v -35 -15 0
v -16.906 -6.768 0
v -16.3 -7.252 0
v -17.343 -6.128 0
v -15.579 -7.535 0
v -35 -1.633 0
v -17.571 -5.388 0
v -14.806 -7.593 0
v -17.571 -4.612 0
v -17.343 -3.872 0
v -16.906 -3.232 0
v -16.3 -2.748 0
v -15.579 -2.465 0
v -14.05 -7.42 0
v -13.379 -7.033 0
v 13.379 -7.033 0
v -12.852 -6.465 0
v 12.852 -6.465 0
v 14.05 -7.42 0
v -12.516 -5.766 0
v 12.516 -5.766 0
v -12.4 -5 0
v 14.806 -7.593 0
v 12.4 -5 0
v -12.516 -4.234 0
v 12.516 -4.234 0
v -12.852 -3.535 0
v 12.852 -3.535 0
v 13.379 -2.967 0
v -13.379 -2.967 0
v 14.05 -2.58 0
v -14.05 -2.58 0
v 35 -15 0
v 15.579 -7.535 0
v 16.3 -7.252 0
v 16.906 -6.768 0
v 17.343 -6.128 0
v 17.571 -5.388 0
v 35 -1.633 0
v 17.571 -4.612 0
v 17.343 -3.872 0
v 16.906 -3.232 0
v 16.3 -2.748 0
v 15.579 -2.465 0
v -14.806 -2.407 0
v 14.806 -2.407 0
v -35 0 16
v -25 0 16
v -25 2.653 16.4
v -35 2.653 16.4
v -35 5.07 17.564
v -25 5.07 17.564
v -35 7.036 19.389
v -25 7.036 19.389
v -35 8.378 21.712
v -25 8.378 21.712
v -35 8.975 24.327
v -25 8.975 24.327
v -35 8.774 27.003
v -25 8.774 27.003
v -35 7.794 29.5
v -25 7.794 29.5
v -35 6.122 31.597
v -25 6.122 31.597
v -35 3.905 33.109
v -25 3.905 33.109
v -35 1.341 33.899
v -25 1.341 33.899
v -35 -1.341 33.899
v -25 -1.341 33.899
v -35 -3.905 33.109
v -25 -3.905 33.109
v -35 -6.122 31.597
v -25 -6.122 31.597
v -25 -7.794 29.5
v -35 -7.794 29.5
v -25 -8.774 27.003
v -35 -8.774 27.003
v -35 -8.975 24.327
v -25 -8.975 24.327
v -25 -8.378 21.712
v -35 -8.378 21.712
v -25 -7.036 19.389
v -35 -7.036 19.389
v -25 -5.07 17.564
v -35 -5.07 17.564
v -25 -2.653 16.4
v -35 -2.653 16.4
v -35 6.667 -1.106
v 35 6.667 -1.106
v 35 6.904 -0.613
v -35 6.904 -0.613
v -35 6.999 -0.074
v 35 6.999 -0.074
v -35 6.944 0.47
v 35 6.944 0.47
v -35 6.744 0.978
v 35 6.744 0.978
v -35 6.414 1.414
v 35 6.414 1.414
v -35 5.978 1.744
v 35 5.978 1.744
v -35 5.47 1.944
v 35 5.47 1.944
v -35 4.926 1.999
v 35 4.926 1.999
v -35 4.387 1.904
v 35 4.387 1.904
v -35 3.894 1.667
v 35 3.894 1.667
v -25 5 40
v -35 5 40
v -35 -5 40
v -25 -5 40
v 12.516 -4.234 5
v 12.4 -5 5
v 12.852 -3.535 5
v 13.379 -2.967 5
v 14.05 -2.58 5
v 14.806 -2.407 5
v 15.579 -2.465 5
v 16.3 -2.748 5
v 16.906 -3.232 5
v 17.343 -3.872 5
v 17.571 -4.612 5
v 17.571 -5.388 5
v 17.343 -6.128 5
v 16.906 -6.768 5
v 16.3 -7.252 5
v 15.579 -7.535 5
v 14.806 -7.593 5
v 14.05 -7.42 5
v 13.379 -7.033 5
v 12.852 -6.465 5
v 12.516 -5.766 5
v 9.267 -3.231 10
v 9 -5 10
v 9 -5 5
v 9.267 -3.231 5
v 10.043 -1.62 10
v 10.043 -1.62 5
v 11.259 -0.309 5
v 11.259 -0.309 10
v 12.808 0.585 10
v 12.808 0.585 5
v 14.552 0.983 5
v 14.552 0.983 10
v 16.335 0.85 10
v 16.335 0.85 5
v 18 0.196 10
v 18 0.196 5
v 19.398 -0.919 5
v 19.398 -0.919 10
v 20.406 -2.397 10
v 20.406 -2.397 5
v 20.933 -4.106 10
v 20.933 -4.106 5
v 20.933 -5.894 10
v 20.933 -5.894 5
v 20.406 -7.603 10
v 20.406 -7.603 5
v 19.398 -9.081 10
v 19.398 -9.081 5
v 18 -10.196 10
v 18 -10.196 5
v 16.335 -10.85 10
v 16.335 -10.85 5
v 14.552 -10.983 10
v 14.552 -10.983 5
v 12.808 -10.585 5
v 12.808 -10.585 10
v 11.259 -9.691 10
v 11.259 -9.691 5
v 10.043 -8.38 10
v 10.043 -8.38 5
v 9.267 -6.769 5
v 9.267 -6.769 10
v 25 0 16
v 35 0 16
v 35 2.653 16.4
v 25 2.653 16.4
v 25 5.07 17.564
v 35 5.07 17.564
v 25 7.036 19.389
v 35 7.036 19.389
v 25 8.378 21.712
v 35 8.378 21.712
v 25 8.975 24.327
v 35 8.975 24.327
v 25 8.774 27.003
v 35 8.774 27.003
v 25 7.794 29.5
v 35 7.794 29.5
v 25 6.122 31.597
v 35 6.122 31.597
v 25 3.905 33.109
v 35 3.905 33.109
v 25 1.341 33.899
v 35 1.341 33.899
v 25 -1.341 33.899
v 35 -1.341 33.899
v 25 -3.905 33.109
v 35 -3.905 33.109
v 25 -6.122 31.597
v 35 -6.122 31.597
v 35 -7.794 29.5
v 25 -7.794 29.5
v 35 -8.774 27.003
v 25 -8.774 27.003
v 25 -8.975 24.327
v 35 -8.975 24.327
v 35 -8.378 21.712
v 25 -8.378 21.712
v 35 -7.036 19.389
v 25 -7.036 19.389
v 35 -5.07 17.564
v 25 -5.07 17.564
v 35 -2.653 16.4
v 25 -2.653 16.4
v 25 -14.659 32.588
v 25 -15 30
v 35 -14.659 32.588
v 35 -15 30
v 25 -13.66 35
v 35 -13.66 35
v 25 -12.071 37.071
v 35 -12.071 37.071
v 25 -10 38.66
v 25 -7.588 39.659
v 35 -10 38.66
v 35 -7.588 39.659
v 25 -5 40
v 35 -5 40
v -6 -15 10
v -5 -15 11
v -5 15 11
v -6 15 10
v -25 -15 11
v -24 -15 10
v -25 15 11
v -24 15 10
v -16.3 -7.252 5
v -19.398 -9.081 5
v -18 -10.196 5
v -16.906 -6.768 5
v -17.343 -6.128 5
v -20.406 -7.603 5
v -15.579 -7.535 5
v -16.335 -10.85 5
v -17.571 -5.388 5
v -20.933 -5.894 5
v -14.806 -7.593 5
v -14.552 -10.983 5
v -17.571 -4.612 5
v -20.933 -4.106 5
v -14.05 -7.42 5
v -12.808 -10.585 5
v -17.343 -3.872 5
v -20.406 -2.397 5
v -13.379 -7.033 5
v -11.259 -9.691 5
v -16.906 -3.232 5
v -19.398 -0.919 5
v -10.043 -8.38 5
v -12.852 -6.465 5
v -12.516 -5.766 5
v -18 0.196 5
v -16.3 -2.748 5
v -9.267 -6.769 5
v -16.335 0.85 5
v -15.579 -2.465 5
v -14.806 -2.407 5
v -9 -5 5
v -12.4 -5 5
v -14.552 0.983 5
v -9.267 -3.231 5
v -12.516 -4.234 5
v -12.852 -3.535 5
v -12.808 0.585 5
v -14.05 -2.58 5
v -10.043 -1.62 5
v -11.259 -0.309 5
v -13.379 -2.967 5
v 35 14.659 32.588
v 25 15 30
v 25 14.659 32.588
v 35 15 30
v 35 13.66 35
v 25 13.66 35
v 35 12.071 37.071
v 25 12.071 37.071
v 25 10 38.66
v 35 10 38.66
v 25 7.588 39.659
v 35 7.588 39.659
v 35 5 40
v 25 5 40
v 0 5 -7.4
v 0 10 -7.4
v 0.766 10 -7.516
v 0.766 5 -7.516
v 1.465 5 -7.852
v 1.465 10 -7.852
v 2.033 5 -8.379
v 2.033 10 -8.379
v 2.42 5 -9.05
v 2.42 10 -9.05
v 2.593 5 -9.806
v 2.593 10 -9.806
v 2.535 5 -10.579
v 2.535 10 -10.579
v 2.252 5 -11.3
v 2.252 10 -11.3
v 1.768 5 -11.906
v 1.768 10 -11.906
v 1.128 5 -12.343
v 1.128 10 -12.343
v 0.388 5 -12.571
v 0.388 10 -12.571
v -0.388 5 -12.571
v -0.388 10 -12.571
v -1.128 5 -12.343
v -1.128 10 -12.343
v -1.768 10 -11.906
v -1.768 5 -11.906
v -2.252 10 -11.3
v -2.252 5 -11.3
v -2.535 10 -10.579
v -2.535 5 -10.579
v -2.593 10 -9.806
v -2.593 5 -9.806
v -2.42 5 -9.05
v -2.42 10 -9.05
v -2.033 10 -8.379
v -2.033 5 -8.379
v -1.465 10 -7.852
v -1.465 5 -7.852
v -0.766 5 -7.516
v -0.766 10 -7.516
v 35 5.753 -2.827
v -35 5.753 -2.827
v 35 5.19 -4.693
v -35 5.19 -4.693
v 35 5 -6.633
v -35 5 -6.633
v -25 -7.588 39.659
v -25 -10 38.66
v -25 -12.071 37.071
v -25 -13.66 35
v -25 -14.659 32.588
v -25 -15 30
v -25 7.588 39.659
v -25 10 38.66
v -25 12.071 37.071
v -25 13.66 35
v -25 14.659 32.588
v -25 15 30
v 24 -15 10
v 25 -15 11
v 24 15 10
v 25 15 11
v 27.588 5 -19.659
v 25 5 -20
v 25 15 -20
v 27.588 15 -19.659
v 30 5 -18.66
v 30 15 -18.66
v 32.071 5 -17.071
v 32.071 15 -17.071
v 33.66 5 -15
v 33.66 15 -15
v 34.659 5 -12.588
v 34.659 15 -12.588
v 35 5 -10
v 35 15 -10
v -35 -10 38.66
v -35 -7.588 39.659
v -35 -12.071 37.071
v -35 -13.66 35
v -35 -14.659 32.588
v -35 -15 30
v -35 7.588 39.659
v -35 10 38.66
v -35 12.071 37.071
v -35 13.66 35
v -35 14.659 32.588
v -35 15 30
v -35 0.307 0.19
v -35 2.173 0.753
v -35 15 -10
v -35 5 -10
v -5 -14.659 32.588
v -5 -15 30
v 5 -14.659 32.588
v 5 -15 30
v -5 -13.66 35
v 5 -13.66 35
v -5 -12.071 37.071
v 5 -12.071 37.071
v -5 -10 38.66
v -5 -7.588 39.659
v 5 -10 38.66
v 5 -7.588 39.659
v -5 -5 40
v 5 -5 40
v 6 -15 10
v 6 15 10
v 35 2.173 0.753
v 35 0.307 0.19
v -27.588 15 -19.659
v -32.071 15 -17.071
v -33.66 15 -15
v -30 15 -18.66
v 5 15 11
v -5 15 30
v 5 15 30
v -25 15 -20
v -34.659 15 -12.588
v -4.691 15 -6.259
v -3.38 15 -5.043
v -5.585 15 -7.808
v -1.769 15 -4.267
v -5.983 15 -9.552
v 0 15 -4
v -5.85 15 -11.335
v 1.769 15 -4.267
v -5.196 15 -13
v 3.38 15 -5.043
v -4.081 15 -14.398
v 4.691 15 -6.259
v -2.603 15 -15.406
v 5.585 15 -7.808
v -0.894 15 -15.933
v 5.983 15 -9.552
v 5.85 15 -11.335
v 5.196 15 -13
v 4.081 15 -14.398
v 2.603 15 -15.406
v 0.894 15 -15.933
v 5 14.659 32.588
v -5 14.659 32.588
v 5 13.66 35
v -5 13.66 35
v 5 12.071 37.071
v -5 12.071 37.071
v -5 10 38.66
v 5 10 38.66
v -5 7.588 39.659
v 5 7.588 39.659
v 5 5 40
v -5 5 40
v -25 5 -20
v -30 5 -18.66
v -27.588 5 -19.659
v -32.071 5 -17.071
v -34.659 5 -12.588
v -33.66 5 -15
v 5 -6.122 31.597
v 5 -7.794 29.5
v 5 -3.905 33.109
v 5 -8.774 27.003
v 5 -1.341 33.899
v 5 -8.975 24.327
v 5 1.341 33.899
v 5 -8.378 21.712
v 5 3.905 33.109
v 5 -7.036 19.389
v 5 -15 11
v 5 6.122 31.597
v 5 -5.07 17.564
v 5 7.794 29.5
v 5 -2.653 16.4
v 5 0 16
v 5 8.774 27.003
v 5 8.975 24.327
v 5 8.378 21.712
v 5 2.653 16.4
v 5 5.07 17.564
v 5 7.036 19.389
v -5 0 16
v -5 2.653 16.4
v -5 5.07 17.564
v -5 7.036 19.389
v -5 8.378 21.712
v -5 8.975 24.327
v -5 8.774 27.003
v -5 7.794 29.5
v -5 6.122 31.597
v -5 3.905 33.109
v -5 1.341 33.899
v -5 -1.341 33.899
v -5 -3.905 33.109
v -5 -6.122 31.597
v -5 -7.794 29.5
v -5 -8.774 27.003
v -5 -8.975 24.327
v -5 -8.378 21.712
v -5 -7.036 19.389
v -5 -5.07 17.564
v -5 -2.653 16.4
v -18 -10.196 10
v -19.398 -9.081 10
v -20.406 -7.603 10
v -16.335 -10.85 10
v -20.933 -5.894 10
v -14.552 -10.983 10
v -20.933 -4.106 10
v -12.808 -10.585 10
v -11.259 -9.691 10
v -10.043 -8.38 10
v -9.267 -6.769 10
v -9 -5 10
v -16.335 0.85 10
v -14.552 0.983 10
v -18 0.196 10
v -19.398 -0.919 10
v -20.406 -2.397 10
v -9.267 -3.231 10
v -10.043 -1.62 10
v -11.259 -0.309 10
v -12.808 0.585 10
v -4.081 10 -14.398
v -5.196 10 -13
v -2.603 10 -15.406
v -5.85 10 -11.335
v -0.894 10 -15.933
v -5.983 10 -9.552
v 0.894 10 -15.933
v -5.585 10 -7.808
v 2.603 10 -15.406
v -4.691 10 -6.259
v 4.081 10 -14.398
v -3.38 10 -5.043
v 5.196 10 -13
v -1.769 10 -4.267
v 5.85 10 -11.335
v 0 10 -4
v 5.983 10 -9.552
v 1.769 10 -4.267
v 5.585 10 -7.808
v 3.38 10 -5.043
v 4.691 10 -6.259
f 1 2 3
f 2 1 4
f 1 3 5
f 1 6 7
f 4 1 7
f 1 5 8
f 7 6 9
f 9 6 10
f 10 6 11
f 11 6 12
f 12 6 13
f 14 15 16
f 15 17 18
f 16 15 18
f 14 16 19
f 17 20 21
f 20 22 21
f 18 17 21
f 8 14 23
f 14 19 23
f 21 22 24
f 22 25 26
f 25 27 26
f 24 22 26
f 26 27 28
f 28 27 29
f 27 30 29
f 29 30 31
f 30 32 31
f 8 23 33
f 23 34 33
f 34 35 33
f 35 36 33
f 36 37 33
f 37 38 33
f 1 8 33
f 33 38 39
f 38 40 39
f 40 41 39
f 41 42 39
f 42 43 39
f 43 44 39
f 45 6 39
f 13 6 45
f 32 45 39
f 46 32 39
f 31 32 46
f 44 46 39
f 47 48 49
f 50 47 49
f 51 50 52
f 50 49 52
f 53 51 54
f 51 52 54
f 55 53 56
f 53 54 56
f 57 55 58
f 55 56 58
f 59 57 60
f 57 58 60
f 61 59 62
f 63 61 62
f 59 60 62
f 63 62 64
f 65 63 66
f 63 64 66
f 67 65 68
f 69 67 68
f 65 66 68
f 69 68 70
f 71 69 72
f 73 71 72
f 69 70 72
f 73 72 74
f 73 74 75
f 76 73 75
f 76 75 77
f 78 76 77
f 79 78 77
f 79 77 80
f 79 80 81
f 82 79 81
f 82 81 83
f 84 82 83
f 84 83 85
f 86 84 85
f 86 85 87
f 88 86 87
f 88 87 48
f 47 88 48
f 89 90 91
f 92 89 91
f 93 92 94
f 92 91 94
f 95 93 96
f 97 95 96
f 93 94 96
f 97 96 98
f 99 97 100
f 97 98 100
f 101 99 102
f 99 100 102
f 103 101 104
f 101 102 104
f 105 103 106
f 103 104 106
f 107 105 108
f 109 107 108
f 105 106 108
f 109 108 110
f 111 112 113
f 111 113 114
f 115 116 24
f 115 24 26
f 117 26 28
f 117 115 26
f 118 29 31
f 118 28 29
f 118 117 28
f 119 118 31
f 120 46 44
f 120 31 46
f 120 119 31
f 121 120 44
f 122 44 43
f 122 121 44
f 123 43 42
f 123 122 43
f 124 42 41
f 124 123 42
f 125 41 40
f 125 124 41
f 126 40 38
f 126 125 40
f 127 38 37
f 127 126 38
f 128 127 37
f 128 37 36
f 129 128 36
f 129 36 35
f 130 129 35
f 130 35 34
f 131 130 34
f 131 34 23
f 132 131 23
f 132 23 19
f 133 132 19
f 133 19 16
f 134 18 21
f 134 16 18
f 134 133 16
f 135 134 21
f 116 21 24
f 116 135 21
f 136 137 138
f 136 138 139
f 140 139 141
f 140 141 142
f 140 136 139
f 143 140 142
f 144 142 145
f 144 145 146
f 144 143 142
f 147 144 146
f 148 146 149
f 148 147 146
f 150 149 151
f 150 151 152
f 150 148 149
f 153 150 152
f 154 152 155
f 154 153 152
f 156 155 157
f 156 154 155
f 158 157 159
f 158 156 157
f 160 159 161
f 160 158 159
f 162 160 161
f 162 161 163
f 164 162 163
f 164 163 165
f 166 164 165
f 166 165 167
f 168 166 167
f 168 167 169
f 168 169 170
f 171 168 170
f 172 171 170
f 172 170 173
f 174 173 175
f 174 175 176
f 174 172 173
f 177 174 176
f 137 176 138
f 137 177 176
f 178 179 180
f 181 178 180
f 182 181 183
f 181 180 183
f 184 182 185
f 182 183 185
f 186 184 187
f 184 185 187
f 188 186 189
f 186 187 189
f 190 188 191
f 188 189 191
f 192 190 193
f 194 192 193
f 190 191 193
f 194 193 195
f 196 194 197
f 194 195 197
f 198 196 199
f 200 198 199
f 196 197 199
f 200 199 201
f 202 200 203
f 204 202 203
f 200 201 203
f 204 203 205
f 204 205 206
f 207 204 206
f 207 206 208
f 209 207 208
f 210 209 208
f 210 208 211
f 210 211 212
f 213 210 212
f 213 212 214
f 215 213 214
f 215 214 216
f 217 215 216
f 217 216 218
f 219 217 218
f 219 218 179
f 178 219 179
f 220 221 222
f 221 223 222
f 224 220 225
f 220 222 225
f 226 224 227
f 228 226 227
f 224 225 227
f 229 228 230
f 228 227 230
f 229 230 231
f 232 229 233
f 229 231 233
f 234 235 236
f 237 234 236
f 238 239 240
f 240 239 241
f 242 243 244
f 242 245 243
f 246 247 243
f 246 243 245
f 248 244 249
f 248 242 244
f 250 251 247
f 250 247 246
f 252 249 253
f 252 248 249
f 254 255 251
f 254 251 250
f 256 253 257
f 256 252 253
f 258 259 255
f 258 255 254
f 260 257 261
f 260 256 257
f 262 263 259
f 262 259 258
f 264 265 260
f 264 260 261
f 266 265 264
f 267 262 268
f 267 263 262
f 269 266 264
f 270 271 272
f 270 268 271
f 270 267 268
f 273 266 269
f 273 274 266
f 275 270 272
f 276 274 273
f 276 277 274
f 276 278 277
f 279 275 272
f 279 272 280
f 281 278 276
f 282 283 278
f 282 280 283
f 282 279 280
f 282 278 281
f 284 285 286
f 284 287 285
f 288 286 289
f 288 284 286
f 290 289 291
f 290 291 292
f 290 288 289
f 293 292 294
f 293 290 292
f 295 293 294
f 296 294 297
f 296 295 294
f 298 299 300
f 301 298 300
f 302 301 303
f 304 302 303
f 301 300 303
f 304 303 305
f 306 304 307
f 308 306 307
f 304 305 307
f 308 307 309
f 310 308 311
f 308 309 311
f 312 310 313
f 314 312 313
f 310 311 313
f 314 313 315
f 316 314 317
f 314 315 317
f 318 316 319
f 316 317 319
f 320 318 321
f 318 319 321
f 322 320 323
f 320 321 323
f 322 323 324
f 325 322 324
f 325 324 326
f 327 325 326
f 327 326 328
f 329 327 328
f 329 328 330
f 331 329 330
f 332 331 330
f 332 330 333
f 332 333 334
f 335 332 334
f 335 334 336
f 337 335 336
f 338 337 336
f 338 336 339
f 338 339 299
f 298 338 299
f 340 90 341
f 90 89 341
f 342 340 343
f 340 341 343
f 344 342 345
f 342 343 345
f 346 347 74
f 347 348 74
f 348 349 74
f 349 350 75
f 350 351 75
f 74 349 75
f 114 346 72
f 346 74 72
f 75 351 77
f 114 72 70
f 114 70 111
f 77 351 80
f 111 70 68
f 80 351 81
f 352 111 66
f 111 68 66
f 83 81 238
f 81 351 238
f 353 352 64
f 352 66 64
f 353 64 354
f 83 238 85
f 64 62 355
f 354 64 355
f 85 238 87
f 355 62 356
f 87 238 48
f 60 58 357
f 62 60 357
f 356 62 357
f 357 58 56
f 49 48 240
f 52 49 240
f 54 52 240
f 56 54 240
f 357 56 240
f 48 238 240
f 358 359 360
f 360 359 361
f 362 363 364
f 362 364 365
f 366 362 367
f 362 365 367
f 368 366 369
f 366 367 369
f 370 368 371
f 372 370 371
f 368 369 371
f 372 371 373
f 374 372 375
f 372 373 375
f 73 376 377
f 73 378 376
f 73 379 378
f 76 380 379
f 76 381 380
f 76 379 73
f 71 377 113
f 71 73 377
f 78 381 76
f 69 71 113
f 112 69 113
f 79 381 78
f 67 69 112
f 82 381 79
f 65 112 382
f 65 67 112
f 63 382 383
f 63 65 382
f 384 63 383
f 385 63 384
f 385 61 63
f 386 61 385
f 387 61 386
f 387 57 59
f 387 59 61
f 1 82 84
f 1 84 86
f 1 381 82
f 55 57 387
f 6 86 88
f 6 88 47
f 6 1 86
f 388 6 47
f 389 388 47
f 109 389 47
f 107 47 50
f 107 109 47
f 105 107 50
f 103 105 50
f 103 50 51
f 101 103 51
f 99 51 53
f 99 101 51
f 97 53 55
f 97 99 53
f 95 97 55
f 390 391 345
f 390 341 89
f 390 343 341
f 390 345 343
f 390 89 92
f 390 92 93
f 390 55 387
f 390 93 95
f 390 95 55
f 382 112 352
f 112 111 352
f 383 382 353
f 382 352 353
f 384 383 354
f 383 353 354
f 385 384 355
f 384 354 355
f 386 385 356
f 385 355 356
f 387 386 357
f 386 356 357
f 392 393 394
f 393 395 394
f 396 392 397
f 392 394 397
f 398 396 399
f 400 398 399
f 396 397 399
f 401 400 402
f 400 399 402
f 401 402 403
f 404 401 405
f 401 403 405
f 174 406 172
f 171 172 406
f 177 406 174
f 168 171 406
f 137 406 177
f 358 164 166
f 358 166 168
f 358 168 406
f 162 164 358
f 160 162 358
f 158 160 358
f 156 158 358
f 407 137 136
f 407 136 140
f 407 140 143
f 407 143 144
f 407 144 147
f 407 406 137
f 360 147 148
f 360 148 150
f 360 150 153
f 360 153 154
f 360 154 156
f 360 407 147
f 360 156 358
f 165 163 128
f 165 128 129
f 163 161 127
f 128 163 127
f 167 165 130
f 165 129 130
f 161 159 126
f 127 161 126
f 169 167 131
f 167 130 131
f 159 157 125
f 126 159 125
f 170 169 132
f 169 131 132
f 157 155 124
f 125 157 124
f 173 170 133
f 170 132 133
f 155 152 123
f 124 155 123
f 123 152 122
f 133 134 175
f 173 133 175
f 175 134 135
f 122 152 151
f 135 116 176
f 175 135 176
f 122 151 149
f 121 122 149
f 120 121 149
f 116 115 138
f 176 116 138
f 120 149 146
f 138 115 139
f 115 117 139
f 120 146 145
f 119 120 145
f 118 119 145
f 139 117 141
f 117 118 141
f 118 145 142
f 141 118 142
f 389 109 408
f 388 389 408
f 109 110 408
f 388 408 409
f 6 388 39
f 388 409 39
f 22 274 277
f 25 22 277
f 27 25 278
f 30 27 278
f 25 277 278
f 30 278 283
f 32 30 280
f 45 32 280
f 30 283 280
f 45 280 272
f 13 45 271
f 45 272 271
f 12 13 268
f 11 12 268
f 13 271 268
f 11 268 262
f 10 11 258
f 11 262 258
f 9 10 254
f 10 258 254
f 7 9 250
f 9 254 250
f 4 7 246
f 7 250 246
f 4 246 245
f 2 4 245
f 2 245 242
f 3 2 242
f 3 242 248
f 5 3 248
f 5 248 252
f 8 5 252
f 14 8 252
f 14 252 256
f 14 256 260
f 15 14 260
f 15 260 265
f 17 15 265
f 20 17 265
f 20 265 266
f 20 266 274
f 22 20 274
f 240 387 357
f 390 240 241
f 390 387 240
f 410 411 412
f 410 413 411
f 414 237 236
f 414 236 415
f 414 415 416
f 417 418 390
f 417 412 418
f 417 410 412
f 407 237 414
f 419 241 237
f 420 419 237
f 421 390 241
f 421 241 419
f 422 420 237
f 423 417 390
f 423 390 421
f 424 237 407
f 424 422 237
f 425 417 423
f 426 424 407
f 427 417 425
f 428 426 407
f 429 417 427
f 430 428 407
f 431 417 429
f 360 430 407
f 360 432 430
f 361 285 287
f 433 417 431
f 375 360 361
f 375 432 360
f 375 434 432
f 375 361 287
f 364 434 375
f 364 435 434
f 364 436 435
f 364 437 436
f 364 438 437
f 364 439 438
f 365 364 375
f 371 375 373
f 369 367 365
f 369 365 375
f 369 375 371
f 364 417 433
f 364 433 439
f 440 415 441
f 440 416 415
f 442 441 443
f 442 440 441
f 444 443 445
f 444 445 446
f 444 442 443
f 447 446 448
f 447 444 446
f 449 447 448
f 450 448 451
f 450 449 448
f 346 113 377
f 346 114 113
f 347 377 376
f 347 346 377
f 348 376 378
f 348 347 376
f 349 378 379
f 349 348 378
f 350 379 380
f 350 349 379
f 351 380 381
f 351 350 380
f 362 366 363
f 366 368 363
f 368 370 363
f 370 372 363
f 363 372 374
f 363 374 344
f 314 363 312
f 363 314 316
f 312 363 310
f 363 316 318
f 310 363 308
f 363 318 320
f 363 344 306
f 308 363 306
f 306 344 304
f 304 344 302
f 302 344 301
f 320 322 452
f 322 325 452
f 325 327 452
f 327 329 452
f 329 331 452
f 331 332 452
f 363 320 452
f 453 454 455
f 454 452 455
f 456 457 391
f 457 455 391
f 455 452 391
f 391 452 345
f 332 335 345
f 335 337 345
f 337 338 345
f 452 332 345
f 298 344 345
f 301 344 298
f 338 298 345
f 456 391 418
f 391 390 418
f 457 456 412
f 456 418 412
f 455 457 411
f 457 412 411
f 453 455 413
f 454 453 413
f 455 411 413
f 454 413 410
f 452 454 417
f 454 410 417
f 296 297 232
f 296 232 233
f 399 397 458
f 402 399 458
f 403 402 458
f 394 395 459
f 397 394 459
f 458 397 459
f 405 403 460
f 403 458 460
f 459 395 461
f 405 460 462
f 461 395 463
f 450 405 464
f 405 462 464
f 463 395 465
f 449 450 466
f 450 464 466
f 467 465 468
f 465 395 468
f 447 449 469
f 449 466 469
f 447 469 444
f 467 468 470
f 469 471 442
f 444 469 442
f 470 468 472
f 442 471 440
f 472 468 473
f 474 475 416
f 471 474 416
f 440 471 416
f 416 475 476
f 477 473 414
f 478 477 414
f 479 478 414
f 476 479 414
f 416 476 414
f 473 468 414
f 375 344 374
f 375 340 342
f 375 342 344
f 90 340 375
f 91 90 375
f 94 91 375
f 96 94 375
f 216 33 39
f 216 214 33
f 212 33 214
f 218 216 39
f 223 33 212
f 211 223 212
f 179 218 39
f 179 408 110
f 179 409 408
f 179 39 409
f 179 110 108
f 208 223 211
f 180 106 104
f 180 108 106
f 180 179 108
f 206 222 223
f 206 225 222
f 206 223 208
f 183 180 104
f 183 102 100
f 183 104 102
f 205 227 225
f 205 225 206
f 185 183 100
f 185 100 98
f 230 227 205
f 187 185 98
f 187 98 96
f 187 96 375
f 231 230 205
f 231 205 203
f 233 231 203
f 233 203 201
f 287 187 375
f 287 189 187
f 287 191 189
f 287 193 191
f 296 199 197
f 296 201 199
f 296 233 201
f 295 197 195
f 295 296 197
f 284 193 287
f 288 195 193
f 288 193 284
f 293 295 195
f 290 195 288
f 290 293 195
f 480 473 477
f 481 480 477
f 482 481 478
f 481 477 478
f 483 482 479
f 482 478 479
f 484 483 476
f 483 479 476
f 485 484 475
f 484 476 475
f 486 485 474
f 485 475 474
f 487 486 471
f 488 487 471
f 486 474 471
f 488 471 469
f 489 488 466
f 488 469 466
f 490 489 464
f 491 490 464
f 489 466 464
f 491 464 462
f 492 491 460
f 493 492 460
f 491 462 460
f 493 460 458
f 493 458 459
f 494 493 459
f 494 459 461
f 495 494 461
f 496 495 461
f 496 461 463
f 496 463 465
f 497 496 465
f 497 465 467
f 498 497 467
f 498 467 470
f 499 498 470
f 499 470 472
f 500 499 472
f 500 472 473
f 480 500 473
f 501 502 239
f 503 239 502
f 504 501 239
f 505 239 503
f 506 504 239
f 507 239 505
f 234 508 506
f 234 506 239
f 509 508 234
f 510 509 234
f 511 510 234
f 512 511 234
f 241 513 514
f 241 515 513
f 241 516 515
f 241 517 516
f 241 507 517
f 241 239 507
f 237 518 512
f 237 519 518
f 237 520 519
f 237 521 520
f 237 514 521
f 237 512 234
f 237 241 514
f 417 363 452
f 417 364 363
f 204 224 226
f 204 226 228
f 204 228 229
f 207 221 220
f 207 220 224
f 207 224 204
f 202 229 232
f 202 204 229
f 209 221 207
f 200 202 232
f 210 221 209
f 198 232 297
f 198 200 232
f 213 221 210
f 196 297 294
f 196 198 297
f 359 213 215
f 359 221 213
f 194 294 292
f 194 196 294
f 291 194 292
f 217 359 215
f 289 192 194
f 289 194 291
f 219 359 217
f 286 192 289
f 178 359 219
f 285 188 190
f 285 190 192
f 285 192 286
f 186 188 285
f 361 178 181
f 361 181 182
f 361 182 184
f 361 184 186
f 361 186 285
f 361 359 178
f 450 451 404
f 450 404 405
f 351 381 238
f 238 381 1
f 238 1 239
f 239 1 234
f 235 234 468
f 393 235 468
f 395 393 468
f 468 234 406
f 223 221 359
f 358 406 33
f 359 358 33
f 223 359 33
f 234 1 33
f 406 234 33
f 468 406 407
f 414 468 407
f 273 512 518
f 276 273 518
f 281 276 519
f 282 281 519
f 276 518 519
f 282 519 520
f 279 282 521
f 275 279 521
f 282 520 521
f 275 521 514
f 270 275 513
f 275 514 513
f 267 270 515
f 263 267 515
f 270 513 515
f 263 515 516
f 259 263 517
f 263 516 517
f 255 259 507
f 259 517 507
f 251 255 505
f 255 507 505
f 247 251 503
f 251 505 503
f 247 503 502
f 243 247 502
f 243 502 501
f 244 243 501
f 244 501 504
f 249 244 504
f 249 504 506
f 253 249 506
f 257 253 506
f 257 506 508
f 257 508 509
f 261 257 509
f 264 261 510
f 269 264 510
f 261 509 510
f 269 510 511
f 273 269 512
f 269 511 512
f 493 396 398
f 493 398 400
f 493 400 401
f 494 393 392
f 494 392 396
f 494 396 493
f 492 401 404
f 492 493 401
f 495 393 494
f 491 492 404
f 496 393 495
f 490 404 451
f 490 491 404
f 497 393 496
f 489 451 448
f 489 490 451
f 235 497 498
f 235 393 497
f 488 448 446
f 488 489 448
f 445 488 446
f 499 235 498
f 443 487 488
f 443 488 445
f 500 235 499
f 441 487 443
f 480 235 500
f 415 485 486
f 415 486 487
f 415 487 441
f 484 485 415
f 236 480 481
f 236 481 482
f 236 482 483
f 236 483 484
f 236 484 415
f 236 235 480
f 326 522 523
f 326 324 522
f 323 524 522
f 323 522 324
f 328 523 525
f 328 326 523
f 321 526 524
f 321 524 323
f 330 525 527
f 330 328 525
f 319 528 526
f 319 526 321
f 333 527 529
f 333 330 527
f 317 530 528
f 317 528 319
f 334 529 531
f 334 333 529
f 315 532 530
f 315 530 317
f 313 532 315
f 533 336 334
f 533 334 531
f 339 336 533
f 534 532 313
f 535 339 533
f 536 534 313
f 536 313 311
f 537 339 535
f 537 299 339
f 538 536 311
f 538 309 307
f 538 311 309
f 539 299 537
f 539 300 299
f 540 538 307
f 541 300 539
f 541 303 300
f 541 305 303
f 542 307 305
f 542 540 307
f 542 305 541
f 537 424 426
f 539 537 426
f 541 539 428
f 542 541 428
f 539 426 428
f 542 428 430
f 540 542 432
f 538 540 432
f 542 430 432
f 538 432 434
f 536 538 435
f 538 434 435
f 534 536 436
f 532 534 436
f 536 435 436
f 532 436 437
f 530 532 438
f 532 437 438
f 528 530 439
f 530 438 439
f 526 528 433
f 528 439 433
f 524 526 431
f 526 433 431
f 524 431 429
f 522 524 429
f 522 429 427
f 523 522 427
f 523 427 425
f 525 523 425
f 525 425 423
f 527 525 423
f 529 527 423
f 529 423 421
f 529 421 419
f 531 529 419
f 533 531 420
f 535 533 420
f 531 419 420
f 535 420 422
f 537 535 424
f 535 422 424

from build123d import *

# Parameters (mm, degrees)
SZKIC1_W                    = 70
SZKIC1_H                    = 30
DODANIE_WYCI_GNI_CIE1_DEPTH = 10
SZKIC2_W                    = 70
SZKIC2_H                    = 10
DODANIE_WYCI_GNI_CIE2_DEPTH = 20
SZKIC3_R                    = 2
WYTNIJ_WYCI_GNI_CIE1_DEPTH  = 75.330343737
ZAOKR_GLENIE1_R             = 10
SZKIC4_W                    = 10
SZKIC4_H                    = 30
DODANIE_WYCI_GNI_CIE3_DEPTH = 30
SZKIC5_R                    = 2.6
WYTNIJ_WYCI_GNI_CIE2_DEPTH  = 49.476798574
SZKIC6_R                    = 6
WYTNIJ_WYCI_GNI_CIE3_DEPTH  = 5
SZKIC7_R                    = 2.6
WYTNIJ_WYCI_GNI_CIE4_DEPTH  = 62.032778079
SZKIC8_R                    = 6
WYTNIJ_WYCI_GNI_CIE5_DEPTH  = 5
ZAOKR_GLENIE2_R             = 10
SZKIC9_R                    = 9
WYTNIJ_WYCI_GNI_CIE6_DEPTH  = 83.006097334
SFAZOWANIE1_SIZE            = 1


with BuildPart() as part:
    # Szkic1 → Dodanie-wyciągnięcie1 (new body)
    with BuildSketch(Plane.XY):
        Rectangle(SZKIC1_W, SZKIC1_H)
    extrude(amount=DODANIE_WYCI_GNI_CIE1_DEPTH)

    # Szkic2 → Dodanie-wyciągnięcie2 (add)
    with BuildSketch(Plane(origin=(0, 0, 0), x_dir=(-1, 0, 0), z_dir=(0, 0, -1))):
        with Locations((0, 10)):
            Rectangle(SZKIC2_W, SZKIC2_H)
    extrude(amount=DODANIE_WYCI_GNI_CIE2_DEPTH)

    # Szkic3 → Wytnij-wyciągnięcie1 (cut, through all)
    with BuildSketch(Plane(origin=(35, 0, 0), x_dir=(0, 0, -1), z_dir=(1, 0, 0))):
        with Locations((0, 5)):
            Circle(SZKIC3_R)
    extrude(amount=-WYTNIJ_WYCI_GNI_CIE1_DEPTH, mode=Mode.SUBTRACT)

    # Zaokrąglenie1
    zaokr_glenie1_edges = [part.edges().sort_by_distance(p)[0] for p in [
        (0, 5, -2),
        (0, 3, 0),
    ]]
    fillet(zaokr_glenie1_edges, radius=ZAOKR_GLENIE1_R)

    # Szkic4 → Dodanie-wyciągnięcie3 (add)
    with BuildSketch(Plane.XY.offset(10)):
        with Locations((-30, 0)):
            Rectangle(SZKIC4_W, SZKIC4_H)
        Rectangle(SZKIC4_W, SZKIC4_H)
        with Locations((30, 0)):
            Rectangle(SZKIC4_W, SZKIC4_H)
    extrude(amount=DODANIE_WYCI_GNI_CIE3_DEPTH)

    # Szkic5 → Wytnij-wyciągnięcie2 (cut, through all)
    with BuildSketch(Plane.XY.offset(10)):
        with Locations((-15, -5)):
            Circle(SZKIC5_R)
    wytnij_wyci_gni_cie2 = extrude(amount=-WYTNIJ_WYCI_GNI_CIE2_DEPTH, mode=Mode.SUBTRACT)

    # Szkic6 → Wytnij-wyciągnięcie3 (cut)
    with BuildSketch(Plane.XY.offset(10)):
        with Locations((-15, -5)):
            Circle(SZKIC6_R)
    wytnij_wyci_gni_cie3 = extrude(amount=-WYTNIJ_WYCI_GNI_CIE3_DEPTH, mode=Mode.SUBTRACT)

    # Lustro1: Wytnij-wyciągnięcie2, Wytnij-wyciągnięcie3 across plane
    add(wytnij_wyci_gni_cie2.mirror(Plane.ZY), mode=Mode.SUBTRACT)
    add(wytnij_wyci_gni_cie3.mirror(Plane.ZY), mode=Mode.SUBTRACT)

    # Szkic7 → Wytnij-wyciągnięcie4 (cut, through all)
    with BuildSketch(Plane(origin=(0, 15, 0), x_dir=(1, 0, 0), z_dir=(0, 1, 0))):
        with Locations(Location((0, 10, 0), (0, 0, 270))):
            Circle(SZKIC7_R)
    extrude(amount=-WYTNIJ_WYCI_GNI_CIE4_DEPTH, mode=Mode.SUBTRACT)

    # Szkic8 → Wytnij-wyciągnięcie5 (cut)
    with BuildSketch(Plane(origin=(0, 15, 0), x_dir=(1, 0, 0), z_dir=(0, 1, 0))):
        with Locations(Location((0, 10, 0), (0, 0, 270))):
            Circle(SZKIC8_R)
    extrude(amount=-WYTNIJ_WYCI_GNI_CIE5_DEPTH, mode=Mode.SUBTRACT)

    # Zaokrąglenie2
    zaokr_glenie2_edges = [part.edges().sort_by_distance(p)[0] for p in [
        (35, 10, -20),
        (-35, 10, -20),
        (-30, -15, 40),
        (-30, 15, 40),
        (0, -15, 40),
        (0, 15, 40),
        (30, 15, 40),
        (30, -15, 40),
    ]]
    fillet(zaokr_glenie2_edges, radius=ZAOKR_GLENIE2_R)

    # Szkic9 → Wytnij-wyciągnięcie6 (cut, through all)
    with BuildSketch(Plane(origin=(35, 0, 0), x_dir=(0, 0, -1), z_dir=(1, 0, 0))):
        with Locations((-25, 0)):
            Circle(SZKIC9_R)
    extrude(amount=-WYTNIJ_WYCI_GNI_CIE6_DEPTH, mode=Mode.SUBTRACT)

    # Sfazowanie1
    sfazowanie1_edges = [part.edges().sort_by_distance(p)[0] for p in [
        (-25, 0, 10),
        (-5, 0, 10),
        (5, 0, 10),
        (25, 0, 10),
    ]]
    chamfer(sfazowanie1_edges, length=SFAZOWANIE1_SIZE)


solid = part.part
